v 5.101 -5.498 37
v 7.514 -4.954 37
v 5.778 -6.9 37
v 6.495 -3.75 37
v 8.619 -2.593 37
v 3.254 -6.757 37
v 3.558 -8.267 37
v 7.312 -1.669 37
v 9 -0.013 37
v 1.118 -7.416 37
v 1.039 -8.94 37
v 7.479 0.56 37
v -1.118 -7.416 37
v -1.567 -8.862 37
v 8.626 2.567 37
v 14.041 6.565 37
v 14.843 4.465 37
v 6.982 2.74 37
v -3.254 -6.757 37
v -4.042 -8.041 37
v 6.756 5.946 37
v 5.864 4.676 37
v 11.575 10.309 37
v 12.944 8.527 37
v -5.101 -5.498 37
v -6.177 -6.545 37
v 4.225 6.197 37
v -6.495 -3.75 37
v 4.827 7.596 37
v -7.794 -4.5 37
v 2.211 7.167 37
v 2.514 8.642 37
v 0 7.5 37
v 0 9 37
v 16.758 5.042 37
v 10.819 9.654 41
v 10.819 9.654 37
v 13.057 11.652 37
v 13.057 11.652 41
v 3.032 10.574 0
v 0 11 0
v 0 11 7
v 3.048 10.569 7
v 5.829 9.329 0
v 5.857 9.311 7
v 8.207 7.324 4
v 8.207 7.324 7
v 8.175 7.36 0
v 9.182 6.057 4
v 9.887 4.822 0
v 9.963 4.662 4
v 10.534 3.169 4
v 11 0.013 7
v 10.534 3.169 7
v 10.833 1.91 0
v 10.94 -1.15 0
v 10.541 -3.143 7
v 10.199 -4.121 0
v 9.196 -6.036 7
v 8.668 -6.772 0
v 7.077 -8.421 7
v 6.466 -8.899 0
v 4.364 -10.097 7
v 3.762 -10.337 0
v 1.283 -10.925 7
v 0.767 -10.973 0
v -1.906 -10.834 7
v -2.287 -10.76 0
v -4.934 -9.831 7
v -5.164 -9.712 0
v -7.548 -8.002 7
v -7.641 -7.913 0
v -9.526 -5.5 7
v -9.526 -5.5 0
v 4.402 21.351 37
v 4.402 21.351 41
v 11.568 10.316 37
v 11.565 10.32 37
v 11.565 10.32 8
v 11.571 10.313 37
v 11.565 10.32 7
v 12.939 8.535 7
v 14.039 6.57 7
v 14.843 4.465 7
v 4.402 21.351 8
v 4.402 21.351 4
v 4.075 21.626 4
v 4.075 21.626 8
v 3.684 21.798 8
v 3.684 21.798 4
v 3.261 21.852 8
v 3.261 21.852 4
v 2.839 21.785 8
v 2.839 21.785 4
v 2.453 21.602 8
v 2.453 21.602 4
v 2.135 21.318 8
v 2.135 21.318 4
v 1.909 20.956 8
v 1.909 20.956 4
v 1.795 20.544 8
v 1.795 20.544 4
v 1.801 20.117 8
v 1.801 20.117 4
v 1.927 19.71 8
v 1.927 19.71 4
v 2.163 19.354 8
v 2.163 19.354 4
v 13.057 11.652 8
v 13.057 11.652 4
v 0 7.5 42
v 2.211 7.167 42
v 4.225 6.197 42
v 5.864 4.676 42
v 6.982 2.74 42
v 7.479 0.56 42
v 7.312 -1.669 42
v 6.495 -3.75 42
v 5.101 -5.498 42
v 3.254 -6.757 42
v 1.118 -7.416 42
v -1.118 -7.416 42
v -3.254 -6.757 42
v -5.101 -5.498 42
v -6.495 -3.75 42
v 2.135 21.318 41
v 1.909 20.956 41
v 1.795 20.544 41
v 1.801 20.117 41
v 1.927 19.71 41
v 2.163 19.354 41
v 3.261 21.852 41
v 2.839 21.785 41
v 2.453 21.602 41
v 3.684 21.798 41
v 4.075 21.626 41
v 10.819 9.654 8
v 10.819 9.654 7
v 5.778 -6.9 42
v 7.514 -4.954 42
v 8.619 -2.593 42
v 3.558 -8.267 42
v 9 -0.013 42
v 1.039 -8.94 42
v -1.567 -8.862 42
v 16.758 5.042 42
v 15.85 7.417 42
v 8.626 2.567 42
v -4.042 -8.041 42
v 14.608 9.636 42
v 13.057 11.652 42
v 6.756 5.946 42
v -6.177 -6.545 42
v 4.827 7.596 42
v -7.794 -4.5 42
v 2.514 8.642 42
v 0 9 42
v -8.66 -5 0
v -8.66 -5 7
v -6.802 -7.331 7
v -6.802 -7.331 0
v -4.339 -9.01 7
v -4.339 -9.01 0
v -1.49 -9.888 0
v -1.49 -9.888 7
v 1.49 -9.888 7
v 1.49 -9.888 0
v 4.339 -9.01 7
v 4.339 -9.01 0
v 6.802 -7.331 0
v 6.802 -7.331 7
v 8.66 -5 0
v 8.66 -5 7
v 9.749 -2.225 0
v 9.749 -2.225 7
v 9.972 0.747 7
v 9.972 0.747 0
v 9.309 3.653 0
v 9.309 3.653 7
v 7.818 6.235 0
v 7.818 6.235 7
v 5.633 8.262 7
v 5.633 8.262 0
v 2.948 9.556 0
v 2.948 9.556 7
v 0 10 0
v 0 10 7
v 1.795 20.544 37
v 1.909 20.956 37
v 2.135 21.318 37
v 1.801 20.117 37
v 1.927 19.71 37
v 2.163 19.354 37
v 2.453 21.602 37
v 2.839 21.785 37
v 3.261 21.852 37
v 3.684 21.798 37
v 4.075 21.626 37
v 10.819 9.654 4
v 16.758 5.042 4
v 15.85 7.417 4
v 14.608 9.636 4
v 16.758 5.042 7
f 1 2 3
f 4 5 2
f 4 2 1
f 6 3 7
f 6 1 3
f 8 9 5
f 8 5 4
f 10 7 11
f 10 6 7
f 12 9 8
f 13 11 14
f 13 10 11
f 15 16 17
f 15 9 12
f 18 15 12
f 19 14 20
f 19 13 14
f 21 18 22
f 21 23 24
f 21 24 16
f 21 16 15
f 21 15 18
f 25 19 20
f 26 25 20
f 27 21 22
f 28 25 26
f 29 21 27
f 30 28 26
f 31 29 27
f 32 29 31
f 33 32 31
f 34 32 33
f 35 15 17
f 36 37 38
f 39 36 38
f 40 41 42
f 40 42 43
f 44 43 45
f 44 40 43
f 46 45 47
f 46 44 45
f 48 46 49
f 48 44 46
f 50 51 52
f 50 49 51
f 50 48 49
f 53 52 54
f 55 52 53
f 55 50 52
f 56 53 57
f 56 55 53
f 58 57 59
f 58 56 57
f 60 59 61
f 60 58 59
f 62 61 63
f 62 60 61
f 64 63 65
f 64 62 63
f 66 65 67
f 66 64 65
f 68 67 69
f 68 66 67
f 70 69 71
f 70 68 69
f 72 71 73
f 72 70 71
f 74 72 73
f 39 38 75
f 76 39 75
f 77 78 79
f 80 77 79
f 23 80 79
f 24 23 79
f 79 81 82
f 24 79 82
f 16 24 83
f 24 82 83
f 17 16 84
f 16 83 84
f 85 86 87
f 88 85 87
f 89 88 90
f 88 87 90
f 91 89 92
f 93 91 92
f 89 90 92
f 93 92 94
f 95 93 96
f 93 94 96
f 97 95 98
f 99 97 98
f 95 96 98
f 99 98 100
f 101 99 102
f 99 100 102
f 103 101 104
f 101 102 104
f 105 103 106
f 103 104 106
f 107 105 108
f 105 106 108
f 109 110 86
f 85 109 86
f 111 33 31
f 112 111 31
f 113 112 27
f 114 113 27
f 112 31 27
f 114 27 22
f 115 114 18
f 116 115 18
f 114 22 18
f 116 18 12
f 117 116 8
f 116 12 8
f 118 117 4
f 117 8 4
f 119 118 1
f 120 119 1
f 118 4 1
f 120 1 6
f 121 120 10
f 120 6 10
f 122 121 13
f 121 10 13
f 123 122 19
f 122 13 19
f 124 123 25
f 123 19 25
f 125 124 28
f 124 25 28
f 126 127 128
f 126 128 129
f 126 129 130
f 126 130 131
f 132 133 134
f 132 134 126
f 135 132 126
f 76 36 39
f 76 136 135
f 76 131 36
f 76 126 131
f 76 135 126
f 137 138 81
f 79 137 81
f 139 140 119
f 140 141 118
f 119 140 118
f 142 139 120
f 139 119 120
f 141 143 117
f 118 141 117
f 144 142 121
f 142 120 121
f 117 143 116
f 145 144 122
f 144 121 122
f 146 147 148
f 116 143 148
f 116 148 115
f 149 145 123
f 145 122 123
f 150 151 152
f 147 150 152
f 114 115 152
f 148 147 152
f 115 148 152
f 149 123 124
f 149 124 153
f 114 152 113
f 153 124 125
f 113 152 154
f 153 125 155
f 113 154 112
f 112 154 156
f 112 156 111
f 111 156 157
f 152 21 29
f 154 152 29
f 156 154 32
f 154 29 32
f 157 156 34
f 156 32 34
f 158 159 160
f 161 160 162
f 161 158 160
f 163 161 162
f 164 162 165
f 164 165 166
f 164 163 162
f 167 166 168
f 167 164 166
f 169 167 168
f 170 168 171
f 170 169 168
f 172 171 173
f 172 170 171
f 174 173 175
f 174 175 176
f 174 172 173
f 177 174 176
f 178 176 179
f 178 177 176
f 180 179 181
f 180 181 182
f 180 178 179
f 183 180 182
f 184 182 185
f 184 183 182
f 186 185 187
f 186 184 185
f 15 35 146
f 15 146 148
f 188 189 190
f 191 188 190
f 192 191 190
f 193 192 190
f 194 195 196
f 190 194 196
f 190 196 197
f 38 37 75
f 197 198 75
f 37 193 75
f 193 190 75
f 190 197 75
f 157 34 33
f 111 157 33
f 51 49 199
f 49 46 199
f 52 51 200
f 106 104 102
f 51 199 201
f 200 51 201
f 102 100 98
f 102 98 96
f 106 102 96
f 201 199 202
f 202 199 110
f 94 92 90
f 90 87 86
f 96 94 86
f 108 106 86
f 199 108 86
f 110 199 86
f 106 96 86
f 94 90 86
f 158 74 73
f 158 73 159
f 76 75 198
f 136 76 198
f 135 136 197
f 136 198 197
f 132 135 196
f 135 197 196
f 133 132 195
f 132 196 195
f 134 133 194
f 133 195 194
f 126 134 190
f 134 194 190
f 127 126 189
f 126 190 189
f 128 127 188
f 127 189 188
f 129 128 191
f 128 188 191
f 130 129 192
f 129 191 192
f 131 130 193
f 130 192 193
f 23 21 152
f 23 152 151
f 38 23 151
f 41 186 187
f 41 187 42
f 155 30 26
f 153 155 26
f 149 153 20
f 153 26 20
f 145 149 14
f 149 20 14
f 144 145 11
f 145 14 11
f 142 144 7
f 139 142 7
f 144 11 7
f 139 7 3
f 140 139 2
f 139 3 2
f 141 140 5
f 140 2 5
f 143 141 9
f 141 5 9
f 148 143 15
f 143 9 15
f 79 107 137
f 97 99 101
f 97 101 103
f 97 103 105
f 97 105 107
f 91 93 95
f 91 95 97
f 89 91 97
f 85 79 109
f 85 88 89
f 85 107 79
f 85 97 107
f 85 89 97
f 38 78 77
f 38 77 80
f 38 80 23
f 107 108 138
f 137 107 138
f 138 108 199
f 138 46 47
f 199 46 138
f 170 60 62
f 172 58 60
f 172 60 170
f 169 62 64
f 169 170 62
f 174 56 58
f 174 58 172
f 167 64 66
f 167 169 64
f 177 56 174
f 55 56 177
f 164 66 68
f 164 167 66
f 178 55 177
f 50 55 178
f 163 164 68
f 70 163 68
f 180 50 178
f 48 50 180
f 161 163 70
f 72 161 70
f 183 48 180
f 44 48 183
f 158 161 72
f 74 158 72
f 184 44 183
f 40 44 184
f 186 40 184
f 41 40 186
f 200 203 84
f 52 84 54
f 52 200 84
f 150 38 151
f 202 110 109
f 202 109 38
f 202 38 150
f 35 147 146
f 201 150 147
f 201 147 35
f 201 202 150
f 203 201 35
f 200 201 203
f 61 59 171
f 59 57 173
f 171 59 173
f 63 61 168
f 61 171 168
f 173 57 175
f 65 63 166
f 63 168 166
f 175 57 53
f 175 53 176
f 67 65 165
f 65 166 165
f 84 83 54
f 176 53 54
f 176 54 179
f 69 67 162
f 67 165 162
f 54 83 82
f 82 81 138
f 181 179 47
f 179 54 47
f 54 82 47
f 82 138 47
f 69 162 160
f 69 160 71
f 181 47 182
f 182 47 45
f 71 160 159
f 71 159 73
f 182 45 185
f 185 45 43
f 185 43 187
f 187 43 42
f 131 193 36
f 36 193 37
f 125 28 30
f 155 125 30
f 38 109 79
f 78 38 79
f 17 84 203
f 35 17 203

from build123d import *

# Parameters (mm, degrees)
BOSS_EXTRUDE1_DEPTH = 7
BOSS_EXTRUDE2_START = -3
BOSS_EXTRUDE2_DEPTH = 3
BOSS_EXTRUDE3_DEPTH = 30
BOSS_EXTRUDE4_DEPTH = 5
BOSS_EXTRUDE5_DEPTH = 5
BOSS_EXTRUDE6_DEPTH = 4
BOSS_EXTRUDE7_DEPTH = 4


with BuildPart() as part:
    # Sketch1 → Boss-Extrude1 (new body)
    with BuildSketch(Plane.XY):
        with BuildLine():
            Line((-9.526279442, -5.5), (-8.660254038, -5))
            ThreePointArc((-8.660254038, -5), (8.660254038, -5), (0, 10))
            Line((0, 10), (0, 11))
            ThreePointArc((0, 11), (9.526279442, -5.5), (-9.526279442, -5.5))
        make_face()
    extrude(amount=BOSS_EXTRUDE1_DEPTH)

    # Sketch3 → Boss-Extrude2 (add)
    with BuildSketch(Plane.XY.offset(7).offset(BOSS_EXTRUDE2_START)):
        with BuildLine():
            Line((8.207415224, 7.323819723), (13.057251493, 11.651531377))
            ThreePointArc((13.057251493, 11.651531377), (15.26959545, 8.549237088), (16.758038643, 5.041640689))
            Line((16.758038643, 5.041640689), (10.53362429, 3.16903129))
            ThreePointArc((10.53362429, 3.16903129), (9.598031426, 5.37380617), (8.207415224, 7.323819723))
        make_face()
    extrude(amount=BOSS_EXTRUDE2_DEPTH)

    # Sketch4 → Boss-Extrude3 (add)
    with BuildSketch(Plane.XY.offset(7)):
        with BuildLine():
            Line((13.057251493, 11.651531377), (11.56499418, 10.319927791))
            ThreePointArc((11.56499418, 10.319927791), (13.524498827, 7.572181421), (14.842834227, 4.465453182))
            Line((14.842834227, 4.465453182), (16.758038643, 5.041640689))
            ThreePointArc((16.758038643, 5.041640689), (15.26959545, 8.549237088), (13.057251493, 11.651531377))
        make_face()
    extrude(amount=BOSS_EXTRUDE3_DEPTH)



with BuildPart() as body_2:
    # Sketch5 → Boss-Extrude4 (new body)
    with BuildSketch(Plane.XY.offset(37)):
        with BuildLine():
            Line((0, 9), (0, 7.5))
            ThreePointArc((0, 7.5), (6.495190528, -3.75), (-6.495190528, -3.75))
            Line((-6.495190528, -3.75), (-7.794228634, -4.5))
            ThreePointArc((-7.794228634, -4.5), (7.794228634, -4.5), (0, 9))
        make_face()
    extrude(amount=BOSS_EXTRUDE4_DEPTH)


with BuildPart() as part_1:
    add(part.part)

    add(body_2.part)  # Boss-Extrude5 merges body 2
    # Sketch6 → Boss-Extrude5 (add)
    with BuildSketch(Plane.XY.offset(37)):
        with BuildLine():
            Line((6.756344772, 5.945738417), (13.057251493, 11.651531377))
            ThreePointArc((13.057251493, 11.651531377), (15.26959545, 8.549237088), (16.758038643, 5.041640689))
            Line((16.758038643, 5.041640689), (8.626140517, 2.567041054))
            ThreePointArc((8.626140517, 2.567041054), (7.87458649, 4.357853556), (6.756344772, 5.945738417))
        make_face()
    extrude(amount=BOSS_EXTRUDE5_DEPTH)

    # Sketch7 → Boss-Extrude6 (add)
    with BuildSketch(Plane(origin=(0, 0, 4), x_dir=(-1, 0, 0), z_dir=(0, 0, -1))):
        with BuildLine():
            Line((-10.818865523, 9.654125998), (-13.057251493, 11.651531377))
            Line((-13.057251493, 11.651531377), (-4.401828185, 21.351203915))
            ThreePointArc((-4.401828185, 21.351203915), (-2.28393251, 21.471694211), (-2.163442214, 19.353798536))
            Line((-2.163442214, 19.353798536), (-10.818865523, 9.654125998))
        make_face()
    extrude(amount=-BOSS_EXTRUDE6_DEPTH)


with BuildPart() as body_2_2:
    # Sketch8 → Boss-Extrude7 (new body)
    with BuildSketch(Plane(origin=(0, 0, 37), x_dir=(-1, 0, 0), z_dir=(0, 0, -1))):
        with BuildLine():
            Line((-10.818865523, 9.654125998), (-13.057251493, 11.651531377))
            Line((-13.057251493, 11.651531377), (-4.401828185, 21.351203915))
            ThreePointArc((-4.401828185, 21.351203915), (-2.28393251, 21.471694211), (-2.163442214, 19.353798536))
            Line((-2.163442214, 19.353798536), (-10.818865523, 9.654125998))
        make_face()
    extrude(amount=-BOSS_EXTRUDE7_DEPTH)


solid = Compound([part_1.part, body_2_2.part])
